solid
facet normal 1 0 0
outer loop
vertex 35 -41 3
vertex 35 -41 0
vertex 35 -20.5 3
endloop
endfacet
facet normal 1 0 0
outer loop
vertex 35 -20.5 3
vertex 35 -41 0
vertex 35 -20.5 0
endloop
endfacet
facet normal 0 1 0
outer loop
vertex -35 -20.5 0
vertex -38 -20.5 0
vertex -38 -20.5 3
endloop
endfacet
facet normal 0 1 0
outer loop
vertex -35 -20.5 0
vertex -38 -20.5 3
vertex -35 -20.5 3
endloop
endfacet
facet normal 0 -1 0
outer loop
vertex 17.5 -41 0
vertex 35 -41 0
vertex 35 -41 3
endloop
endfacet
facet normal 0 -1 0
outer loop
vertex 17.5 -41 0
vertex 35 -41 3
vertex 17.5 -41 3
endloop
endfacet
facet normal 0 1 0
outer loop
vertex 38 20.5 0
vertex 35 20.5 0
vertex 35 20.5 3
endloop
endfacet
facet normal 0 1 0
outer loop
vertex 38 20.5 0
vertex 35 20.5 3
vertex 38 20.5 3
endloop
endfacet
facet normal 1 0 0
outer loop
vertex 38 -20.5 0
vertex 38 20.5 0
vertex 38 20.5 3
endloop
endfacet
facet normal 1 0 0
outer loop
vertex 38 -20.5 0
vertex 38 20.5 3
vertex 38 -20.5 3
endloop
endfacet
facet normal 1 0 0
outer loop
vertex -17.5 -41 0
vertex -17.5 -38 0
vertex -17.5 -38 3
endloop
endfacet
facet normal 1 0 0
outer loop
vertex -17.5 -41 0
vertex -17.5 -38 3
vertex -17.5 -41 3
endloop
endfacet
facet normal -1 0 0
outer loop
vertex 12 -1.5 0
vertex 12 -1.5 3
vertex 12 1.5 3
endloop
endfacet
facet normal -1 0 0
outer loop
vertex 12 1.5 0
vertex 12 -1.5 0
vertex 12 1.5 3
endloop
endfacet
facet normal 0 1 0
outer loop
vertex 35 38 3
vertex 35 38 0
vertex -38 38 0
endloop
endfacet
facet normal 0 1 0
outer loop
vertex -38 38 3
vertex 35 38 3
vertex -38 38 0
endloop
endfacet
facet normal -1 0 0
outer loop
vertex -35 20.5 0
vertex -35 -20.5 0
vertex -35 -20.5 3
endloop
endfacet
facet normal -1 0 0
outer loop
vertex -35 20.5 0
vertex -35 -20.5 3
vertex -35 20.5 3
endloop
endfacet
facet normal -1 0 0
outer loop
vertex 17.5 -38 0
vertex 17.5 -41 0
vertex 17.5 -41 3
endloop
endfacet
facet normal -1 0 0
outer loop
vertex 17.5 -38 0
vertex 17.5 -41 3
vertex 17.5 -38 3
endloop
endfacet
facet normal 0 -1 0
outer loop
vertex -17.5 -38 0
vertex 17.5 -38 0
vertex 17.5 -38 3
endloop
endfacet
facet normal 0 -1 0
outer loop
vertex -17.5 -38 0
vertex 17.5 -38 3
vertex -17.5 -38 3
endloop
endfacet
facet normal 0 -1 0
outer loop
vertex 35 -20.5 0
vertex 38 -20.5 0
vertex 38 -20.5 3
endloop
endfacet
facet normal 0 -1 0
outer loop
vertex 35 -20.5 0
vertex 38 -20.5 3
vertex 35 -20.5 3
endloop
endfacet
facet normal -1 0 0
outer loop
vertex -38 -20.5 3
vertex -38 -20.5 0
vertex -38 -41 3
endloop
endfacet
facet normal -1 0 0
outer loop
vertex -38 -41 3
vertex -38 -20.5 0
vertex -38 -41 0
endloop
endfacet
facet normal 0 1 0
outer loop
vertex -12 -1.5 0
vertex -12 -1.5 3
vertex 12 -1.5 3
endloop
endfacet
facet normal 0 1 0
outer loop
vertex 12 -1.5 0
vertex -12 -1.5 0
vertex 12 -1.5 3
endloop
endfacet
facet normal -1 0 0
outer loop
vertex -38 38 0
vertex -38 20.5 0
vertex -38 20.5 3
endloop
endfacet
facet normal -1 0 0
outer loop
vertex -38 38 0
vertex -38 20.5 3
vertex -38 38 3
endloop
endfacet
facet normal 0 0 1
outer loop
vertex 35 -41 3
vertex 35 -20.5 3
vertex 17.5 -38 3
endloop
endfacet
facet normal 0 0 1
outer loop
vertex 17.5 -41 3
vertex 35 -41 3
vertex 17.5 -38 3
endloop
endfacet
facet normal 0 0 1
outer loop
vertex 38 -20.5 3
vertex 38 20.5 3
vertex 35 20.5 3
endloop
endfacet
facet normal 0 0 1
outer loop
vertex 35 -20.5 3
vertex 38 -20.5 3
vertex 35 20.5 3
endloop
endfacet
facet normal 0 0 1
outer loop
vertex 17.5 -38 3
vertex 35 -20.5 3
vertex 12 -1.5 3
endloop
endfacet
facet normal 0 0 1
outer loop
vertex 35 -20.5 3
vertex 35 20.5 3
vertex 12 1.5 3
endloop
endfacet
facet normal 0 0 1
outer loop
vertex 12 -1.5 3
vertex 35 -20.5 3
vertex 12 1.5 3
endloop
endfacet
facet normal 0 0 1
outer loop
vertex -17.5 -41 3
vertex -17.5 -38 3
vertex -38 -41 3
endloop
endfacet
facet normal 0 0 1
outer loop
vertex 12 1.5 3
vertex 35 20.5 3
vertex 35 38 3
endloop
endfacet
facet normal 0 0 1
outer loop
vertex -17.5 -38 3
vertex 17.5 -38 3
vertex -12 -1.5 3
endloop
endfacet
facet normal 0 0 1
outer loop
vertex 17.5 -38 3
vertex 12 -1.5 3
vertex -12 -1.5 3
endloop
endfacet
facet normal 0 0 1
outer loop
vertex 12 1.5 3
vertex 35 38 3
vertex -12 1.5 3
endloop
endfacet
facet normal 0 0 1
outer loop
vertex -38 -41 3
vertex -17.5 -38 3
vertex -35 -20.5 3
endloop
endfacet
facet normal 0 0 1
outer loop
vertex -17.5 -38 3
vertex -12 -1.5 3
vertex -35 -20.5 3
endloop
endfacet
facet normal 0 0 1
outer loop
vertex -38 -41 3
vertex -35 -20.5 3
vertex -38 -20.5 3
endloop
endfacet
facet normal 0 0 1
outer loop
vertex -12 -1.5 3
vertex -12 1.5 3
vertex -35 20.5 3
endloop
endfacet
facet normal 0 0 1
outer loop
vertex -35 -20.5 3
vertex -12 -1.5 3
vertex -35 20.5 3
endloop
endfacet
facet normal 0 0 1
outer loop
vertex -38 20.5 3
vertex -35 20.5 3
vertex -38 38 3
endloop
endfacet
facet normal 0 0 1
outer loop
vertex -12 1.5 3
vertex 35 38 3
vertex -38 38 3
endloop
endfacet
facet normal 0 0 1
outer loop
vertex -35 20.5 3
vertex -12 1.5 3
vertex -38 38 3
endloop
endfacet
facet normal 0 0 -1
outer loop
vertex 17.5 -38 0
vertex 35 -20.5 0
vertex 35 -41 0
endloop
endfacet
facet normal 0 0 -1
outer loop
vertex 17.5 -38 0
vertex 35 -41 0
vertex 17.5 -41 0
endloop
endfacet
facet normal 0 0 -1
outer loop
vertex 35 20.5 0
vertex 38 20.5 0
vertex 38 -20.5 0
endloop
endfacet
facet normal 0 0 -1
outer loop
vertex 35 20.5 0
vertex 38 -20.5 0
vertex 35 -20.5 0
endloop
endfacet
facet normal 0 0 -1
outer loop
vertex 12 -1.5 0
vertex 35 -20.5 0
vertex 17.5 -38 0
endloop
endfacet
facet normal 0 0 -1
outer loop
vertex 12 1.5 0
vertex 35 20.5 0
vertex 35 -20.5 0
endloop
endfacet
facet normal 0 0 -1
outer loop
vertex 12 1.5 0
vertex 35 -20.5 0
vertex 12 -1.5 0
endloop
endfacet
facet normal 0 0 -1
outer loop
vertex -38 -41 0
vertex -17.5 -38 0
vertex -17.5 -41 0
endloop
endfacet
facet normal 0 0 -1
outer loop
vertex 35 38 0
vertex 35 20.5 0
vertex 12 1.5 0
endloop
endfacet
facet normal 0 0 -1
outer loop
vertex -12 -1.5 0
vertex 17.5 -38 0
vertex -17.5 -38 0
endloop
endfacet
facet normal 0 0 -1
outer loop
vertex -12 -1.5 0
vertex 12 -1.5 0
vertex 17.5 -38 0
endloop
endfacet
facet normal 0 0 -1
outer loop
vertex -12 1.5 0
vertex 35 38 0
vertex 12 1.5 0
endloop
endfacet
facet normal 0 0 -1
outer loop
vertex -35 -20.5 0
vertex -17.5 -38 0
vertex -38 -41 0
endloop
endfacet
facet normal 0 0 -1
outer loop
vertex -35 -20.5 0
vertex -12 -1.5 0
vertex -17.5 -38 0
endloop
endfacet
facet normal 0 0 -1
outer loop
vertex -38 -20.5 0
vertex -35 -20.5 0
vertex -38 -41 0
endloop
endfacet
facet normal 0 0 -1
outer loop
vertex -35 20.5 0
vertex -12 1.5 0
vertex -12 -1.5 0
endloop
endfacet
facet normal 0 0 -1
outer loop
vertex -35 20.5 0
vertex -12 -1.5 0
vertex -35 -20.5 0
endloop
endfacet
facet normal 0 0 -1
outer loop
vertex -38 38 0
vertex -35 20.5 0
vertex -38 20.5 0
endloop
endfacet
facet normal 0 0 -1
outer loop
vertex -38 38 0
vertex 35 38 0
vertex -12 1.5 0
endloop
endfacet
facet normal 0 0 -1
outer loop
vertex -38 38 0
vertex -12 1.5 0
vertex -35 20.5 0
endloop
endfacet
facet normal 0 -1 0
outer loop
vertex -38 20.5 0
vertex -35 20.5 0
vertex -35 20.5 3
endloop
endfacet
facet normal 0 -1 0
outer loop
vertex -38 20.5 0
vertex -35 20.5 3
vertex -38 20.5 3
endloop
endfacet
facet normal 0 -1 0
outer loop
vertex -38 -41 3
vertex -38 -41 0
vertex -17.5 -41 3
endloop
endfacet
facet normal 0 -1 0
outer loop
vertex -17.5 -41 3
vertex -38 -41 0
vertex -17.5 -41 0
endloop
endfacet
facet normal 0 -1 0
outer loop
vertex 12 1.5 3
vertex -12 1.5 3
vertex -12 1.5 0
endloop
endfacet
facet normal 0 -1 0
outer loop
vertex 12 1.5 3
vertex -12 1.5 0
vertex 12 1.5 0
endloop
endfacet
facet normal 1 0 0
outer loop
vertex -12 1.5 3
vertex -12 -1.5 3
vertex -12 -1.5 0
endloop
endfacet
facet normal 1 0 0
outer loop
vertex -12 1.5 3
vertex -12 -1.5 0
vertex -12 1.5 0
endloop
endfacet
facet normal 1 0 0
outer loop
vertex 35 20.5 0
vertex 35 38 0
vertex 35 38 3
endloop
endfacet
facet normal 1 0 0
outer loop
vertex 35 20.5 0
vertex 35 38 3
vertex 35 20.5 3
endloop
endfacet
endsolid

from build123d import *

# Parameters (mm, degrees)
BOSS_EXTRUDE1_DEPTH = 3
SKETCH2_W           = 24
SKETCH2_H           = 3
CUT_EXTRUDE1_DEPTH  = 3


with BuildPart() as part:
    # Sketch1 → Boss-Extrude1 (new body)
    with BuildSketch(Plane.XY):
        Polygon((-35, 38), (-17.5, 38), (17.5, 38), (35, 38), (35, 20.5), (38, 20.5), (38, -20.5), (35, -20.5), (35, -38), (35, -41), (17.5, -41), (17.5, -38), (-17.5, -38), (-17.5, -41), (-35, -41), (-38, -41), (-38, -38), (-38, -20.5), (-35, -20.5), (-35, 20.5), (-38, 20.5), (-38, 38), align=None)
    extrude(amount=BOSS_EXTRUDE1_DEPTH)

    # Sketch2 → Cut-Extrude1 (cut)
    with BuildSketch(Plane.XY.offset(3)):
        Rectangle(SKETCH2_W, SKETCH2_H)
    extrude(amount=-CUT_EXTRUDE1_DEPTH, mode=Mode.SUBTRACT)


solid = part.part
